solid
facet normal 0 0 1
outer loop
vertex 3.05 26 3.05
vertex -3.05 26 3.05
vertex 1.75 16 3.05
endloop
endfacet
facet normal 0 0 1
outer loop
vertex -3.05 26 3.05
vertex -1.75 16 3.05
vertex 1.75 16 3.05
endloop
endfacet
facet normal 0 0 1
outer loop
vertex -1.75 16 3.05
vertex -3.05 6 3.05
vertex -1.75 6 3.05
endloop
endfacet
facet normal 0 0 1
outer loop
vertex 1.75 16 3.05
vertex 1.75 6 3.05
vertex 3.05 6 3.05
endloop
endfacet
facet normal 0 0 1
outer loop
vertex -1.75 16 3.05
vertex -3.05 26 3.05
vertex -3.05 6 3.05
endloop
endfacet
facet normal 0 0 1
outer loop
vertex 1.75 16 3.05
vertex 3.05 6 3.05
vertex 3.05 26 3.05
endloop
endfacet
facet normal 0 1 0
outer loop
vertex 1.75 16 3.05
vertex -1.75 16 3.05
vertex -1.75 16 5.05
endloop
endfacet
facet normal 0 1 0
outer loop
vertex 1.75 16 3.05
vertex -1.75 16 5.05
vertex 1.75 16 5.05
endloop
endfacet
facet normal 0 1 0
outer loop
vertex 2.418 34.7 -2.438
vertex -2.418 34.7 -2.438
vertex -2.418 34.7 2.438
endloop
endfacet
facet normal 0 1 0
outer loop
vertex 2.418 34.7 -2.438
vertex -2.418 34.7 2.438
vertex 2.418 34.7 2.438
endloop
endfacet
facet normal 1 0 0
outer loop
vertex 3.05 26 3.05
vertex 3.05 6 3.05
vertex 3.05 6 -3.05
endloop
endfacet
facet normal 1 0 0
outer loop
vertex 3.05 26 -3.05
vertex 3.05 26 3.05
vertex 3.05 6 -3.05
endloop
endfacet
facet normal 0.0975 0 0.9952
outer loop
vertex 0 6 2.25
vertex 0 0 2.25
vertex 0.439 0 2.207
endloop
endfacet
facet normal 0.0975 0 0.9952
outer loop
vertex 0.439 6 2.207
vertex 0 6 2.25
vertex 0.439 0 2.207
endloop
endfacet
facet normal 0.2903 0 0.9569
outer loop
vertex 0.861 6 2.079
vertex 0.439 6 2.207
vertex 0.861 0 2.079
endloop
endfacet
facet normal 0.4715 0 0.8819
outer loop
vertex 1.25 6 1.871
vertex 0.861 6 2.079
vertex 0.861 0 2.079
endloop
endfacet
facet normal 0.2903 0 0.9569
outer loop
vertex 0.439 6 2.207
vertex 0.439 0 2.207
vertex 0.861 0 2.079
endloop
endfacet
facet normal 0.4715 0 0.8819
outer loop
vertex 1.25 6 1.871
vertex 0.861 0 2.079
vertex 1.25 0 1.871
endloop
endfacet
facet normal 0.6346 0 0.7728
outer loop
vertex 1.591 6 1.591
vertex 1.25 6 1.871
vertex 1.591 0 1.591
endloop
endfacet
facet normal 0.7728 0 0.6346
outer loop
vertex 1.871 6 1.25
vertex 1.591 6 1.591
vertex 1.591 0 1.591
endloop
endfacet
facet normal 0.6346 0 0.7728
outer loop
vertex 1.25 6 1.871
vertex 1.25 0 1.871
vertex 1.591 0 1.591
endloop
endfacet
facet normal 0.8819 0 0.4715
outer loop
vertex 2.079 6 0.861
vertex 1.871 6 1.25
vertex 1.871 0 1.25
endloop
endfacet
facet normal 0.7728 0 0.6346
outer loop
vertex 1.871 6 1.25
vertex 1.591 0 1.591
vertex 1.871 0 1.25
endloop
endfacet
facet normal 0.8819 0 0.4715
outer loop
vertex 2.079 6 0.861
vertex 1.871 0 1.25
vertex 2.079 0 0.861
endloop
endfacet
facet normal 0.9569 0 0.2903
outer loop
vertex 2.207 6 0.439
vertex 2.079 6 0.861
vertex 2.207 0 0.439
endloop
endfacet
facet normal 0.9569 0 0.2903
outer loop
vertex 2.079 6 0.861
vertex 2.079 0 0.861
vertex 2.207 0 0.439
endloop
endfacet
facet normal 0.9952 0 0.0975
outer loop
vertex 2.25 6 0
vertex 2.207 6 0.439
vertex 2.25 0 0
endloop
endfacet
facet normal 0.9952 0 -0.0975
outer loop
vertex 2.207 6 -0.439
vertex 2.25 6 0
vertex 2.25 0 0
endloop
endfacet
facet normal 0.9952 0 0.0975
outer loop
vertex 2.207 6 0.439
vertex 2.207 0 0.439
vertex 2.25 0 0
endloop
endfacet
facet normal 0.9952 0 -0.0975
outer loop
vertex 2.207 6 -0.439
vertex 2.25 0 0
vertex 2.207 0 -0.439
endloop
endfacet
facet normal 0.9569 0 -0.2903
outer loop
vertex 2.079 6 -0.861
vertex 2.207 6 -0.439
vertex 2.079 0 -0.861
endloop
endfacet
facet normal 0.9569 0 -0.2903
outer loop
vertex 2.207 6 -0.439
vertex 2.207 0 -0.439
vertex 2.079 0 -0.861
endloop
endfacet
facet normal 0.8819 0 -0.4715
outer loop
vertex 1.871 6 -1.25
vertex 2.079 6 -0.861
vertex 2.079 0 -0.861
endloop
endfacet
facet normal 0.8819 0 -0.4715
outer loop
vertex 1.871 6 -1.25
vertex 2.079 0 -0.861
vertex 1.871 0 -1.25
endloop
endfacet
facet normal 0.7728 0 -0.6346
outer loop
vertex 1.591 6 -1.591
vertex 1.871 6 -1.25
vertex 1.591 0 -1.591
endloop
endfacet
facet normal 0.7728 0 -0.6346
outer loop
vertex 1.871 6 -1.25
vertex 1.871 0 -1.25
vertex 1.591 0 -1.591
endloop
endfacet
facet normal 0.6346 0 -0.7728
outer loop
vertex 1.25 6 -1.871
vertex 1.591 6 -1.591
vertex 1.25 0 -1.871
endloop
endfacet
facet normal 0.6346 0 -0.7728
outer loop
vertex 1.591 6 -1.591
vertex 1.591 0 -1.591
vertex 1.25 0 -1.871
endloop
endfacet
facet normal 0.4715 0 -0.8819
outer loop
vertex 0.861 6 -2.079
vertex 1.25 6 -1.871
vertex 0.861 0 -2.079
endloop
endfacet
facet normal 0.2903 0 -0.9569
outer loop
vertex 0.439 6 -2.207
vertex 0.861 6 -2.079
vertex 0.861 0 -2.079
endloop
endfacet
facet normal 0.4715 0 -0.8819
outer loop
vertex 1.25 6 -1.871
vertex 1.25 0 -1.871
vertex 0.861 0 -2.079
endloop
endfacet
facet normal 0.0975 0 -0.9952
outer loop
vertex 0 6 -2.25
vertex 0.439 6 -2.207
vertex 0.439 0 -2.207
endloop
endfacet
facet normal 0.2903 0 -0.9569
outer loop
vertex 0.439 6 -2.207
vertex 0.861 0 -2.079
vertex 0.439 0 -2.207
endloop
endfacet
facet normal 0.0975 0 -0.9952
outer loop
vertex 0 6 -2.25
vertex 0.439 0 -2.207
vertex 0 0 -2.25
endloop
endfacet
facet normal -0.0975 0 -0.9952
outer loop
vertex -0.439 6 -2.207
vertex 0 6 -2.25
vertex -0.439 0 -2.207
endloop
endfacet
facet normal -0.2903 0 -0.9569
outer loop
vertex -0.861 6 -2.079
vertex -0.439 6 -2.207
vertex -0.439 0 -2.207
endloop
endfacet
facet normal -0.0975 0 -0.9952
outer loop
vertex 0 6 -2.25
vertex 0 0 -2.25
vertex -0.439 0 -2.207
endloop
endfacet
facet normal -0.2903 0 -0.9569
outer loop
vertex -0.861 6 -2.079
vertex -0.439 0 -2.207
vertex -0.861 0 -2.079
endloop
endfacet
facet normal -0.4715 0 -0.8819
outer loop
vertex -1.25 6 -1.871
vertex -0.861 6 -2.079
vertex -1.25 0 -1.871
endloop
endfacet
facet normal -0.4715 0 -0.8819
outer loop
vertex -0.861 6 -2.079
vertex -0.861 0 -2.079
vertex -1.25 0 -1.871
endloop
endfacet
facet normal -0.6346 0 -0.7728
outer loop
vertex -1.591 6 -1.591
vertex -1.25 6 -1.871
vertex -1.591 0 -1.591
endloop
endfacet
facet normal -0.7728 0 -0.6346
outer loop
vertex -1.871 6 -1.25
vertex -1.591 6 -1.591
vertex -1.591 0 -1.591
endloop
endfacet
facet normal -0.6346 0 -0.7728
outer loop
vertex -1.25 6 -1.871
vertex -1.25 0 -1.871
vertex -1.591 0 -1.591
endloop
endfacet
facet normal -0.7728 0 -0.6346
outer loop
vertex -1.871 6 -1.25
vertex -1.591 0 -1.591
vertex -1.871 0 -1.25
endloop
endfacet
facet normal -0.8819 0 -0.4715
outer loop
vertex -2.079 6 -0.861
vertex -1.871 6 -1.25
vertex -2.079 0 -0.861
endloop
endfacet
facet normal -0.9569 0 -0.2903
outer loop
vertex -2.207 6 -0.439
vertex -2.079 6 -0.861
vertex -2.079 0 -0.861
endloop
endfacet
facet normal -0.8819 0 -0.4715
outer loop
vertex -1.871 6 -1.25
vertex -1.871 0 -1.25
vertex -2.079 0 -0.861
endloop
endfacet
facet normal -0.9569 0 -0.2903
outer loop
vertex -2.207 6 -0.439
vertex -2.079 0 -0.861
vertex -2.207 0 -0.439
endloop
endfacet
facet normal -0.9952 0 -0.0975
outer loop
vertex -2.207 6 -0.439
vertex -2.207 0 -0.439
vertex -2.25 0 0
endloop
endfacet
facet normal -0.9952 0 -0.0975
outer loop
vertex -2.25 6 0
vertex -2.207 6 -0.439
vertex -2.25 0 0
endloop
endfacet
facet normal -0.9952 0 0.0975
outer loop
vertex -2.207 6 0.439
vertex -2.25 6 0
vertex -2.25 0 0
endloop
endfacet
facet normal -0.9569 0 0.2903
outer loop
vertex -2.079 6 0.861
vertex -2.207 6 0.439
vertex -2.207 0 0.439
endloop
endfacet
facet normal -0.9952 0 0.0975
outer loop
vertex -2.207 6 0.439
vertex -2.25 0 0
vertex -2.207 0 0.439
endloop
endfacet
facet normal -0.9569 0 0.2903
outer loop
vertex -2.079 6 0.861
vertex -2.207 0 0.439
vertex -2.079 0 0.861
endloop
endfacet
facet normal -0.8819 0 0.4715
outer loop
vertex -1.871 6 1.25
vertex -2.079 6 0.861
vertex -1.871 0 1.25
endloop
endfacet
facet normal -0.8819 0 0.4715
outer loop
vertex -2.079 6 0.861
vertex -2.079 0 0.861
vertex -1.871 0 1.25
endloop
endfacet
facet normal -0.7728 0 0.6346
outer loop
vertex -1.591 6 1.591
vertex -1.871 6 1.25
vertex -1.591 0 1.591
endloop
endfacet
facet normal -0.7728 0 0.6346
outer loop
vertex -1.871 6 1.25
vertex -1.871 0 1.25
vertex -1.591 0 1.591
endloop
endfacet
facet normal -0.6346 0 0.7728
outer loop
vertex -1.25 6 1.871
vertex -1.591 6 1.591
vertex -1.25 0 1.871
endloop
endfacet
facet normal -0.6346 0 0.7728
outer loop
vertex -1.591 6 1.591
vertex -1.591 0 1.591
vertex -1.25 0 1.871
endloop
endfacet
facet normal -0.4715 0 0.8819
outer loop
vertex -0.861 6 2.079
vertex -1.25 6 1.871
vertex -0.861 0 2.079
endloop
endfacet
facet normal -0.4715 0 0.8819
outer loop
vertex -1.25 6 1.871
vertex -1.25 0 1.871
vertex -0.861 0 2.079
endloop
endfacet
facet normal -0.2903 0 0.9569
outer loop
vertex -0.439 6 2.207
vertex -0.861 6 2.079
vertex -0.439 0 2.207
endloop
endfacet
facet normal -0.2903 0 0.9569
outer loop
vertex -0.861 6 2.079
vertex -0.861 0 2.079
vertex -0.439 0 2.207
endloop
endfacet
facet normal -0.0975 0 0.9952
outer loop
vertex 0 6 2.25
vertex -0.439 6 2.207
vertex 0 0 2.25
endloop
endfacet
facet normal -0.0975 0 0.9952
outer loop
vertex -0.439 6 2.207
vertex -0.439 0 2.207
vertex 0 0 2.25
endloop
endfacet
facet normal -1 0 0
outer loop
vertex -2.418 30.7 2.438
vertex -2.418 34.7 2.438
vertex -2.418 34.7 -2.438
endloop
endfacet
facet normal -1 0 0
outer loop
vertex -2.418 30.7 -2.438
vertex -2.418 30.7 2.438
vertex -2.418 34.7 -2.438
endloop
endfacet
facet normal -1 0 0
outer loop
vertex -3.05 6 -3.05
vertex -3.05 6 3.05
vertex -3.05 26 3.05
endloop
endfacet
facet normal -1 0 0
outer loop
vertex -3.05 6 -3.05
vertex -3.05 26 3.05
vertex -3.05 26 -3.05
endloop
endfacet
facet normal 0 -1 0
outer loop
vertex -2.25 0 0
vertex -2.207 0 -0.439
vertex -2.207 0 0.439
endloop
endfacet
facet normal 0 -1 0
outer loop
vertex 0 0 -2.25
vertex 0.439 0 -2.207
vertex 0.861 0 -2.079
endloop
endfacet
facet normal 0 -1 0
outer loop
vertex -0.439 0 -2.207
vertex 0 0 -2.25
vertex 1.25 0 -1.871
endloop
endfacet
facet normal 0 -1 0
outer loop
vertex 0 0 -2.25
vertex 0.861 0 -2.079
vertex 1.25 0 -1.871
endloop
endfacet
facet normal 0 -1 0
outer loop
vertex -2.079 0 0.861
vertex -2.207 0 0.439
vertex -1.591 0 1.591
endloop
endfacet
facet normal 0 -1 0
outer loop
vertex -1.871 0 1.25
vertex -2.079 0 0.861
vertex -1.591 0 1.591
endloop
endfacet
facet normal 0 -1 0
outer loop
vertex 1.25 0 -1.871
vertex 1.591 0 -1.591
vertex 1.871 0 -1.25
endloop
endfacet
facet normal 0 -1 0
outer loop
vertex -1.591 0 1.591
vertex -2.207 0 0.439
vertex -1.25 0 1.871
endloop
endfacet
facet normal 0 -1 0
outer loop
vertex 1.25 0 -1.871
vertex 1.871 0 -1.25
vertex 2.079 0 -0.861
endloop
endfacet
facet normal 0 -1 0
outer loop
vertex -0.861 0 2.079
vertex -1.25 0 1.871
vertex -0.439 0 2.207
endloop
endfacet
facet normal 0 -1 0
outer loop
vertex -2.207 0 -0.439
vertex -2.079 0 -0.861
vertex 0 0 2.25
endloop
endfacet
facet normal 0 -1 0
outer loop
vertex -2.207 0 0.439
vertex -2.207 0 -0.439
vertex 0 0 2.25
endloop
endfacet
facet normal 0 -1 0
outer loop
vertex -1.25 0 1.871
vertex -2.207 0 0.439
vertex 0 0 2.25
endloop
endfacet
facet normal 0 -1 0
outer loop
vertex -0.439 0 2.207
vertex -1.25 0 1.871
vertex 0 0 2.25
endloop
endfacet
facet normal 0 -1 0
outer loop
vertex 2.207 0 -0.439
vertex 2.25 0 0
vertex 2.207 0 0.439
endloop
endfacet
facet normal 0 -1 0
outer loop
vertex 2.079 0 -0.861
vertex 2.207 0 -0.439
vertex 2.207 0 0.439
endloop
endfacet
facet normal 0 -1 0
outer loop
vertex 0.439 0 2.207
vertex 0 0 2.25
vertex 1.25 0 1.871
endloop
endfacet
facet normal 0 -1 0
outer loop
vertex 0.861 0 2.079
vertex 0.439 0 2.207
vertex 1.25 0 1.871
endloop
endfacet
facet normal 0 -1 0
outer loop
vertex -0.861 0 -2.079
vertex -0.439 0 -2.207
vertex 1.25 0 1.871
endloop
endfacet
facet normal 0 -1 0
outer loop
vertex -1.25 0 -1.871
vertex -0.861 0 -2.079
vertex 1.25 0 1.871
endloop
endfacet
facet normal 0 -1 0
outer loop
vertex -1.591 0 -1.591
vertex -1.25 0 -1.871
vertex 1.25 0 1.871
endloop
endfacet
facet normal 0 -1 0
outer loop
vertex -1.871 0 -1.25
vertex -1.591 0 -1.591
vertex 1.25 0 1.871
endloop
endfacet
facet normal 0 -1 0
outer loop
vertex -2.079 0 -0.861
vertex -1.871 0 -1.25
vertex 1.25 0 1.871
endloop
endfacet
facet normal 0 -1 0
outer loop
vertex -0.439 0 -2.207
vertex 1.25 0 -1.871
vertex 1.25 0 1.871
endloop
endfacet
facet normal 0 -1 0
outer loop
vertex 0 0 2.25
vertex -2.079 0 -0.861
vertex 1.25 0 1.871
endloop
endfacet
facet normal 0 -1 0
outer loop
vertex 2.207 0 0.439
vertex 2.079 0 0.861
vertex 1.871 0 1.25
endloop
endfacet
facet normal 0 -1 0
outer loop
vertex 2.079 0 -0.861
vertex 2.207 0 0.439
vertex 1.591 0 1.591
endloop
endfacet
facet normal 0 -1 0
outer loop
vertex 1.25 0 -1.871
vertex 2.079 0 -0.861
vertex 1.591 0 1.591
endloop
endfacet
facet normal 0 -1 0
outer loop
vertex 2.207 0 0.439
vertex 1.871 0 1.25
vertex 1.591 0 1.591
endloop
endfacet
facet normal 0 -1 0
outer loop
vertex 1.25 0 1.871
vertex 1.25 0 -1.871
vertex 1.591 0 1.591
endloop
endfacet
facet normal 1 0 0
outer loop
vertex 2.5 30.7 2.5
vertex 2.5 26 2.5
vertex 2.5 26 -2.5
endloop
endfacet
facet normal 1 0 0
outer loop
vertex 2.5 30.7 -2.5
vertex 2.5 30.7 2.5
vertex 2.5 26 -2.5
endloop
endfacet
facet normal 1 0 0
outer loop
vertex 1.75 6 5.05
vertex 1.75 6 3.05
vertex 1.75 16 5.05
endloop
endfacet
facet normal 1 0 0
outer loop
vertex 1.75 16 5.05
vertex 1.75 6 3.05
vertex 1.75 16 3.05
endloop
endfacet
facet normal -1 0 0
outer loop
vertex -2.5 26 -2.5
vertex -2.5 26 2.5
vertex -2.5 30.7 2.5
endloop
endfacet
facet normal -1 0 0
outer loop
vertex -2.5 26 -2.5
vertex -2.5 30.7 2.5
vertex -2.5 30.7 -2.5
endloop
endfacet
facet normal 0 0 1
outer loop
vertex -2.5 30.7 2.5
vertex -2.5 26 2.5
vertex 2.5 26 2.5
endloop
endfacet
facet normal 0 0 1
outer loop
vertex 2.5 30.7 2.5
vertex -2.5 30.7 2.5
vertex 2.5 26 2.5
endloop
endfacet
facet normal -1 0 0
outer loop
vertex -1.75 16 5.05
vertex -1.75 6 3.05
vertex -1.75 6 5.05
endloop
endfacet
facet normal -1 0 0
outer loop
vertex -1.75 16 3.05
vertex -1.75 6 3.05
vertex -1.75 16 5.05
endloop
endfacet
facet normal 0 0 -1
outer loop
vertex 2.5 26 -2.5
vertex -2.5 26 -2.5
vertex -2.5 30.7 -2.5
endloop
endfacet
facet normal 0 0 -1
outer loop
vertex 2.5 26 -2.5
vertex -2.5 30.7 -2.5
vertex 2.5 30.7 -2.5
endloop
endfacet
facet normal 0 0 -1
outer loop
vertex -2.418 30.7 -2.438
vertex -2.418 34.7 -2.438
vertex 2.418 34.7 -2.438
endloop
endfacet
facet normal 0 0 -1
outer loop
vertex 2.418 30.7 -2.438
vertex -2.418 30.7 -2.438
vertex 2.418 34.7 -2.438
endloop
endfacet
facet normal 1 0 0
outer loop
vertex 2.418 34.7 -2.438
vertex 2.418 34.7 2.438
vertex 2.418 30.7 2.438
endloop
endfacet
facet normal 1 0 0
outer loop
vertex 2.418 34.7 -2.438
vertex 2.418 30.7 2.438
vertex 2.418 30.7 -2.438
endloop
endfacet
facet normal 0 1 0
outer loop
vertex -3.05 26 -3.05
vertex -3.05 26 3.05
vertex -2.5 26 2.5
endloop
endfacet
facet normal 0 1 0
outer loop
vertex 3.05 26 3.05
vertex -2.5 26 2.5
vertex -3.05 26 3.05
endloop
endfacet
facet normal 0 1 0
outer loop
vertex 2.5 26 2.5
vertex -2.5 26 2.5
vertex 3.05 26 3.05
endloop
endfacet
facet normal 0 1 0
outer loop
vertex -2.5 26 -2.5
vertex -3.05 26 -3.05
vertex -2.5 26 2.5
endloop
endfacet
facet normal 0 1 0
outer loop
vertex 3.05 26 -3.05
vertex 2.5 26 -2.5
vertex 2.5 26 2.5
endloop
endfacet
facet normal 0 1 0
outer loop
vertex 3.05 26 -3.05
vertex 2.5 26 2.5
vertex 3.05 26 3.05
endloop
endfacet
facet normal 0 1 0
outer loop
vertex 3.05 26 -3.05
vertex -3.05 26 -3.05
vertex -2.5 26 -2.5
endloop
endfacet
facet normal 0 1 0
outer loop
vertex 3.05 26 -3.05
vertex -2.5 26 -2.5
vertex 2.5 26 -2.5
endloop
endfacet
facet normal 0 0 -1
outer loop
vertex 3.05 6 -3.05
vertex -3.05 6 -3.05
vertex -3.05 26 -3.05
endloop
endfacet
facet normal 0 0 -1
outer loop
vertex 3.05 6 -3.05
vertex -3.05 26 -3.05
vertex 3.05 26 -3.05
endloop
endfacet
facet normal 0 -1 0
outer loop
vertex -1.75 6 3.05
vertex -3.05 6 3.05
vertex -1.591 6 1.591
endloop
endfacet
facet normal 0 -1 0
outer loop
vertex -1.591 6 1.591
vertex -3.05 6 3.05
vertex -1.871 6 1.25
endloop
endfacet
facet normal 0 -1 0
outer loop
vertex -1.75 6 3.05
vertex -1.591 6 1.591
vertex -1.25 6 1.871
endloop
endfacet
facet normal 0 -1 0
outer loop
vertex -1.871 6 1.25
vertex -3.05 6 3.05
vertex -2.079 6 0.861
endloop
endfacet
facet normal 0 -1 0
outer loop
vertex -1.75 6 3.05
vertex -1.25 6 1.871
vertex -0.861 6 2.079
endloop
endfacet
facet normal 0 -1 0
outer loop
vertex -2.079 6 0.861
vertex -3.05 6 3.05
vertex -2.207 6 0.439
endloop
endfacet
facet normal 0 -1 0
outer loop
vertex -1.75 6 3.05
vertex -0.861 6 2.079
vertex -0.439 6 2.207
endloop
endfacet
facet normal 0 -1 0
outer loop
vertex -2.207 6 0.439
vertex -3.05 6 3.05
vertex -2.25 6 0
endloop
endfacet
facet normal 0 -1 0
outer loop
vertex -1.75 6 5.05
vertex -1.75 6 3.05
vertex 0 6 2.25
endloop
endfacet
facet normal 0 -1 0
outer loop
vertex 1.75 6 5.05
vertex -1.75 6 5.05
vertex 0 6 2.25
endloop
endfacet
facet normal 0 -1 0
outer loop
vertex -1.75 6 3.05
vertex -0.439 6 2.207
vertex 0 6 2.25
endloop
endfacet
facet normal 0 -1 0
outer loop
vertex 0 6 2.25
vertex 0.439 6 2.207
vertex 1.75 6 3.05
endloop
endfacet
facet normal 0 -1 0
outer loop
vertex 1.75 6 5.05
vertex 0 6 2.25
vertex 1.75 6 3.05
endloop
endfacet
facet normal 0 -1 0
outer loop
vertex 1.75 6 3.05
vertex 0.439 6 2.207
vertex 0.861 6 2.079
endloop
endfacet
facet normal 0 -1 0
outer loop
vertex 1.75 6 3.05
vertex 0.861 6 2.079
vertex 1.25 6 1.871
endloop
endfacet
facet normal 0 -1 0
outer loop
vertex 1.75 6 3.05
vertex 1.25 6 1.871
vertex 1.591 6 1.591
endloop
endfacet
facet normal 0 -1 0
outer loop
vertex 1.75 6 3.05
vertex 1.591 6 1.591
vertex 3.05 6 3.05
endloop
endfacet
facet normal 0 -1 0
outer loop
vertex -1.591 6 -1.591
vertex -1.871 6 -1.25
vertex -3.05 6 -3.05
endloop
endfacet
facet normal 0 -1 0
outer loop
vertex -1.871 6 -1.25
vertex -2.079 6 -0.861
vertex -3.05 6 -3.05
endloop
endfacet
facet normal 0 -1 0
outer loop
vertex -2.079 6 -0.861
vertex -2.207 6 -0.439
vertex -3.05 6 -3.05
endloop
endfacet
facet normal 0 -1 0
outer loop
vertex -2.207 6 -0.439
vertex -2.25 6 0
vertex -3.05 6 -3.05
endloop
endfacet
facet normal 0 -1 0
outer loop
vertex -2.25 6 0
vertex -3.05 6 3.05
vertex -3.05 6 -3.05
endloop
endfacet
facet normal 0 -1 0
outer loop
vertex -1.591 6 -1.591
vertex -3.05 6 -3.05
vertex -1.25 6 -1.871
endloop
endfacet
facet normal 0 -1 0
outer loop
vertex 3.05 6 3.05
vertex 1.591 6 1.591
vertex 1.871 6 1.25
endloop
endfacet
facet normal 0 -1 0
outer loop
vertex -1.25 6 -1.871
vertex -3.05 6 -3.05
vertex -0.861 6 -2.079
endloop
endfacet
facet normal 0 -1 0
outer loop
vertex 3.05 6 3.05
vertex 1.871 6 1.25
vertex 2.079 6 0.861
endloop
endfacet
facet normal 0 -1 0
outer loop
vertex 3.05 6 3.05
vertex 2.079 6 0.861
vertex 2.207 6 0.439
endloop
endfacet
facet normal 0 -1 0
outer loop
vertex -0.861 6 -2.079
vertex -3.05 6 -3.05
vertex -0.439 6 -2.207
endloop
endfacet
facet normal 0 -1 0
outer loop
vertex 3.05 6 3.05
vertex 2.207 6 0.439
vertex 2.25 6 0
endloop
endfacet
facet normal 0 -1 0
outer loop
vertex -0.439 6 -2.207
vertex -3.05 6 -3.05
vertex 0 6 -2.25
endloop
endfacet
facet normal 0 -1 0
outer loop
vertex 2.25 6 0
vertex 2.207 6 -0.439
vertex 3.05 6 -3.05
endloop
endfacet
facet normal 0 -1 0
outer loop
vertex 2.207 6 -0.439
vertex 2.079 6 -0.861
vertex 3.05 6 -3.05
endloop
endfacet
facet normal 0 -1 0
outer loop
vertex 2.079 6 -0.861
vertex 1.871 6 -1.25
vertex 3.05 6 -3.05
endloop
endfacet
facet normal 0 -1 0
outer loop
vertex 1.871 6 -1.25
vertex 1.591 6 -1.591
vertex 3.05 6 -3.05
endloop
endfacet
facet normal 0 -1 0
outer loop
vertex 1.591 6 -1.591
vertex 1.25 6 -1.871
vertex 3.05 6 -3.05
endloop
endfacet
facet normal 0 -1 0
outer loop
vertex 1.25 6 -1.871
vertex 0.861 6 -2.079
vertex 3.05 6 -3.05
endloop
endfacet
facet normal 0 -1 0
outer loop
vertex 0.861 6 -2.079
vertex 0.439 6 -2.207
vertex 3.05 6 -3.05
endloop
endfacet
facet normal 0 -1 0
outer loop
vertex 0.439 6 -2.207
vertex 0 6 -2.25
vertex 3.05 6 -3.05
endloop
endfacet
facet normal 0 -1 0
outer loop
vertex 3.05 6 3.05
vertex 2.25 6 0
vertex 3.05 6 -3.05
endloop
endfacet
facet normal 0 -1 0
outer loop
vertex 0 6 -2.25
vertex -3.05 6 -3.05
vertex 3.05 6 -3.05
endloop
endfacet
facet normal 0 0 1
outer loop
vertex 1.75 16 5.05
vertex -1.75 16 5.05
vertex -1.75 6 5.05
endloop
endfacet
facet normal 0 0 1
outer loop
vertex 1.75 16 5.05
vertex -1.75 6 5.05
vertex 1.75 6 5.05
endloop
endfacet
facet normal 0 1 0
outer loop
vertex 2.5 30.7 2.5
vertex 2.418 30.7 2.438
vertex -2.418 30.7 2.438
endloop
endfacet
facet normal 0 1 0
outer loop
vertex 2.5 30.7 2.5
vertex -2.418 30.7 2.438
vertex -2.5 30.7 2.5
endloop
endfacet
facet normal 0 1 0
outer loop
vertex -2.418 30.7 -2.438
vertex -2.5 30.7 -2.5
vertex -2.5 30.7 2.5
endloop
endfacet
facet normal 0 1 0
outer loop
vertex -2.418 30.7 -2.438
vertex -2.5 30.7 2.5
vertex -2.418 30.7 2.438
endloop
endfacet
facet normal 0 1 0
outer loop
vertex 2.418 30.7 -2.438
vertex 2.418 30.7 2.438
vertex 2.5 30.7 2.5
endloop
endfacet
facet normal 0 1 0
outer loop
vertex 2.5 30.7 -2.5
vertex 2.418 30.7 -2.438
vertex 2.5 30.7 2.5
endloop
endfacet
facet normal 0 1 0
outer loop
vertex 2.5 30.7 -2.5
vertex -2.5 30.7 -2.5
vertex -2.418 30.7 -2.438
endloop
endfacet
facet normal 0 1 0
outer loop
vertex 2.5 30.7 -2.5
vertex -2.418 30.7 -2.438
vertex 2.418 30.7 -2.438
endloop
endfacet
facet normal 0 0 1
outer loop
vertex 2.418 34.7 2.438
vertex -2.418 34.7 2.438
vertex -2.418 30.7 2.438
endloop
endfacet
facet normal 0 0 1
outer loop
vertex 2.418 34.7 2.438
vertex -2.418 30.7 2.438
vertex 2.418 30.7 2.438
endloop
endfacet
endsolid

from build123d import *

# Parameters (mm, degrees)
SKETCH1_R           = 2.25
BOSS_EXTRUDE1_DEPTH = 6
SKETCH2_W           = 6.1
SKETCH2_H           = 6.1
BOSS_EXTRUDE2_DEPTH = 20
SKETCH3_W           = 5
SKETCH3_H           = 5
BOSS_EXTRUDE3_DEPTH = 8.7
SKETCH4_OUTSIDE_W   = 15.252
SKETCH4_OUTSIDE_H   = 15.252
SKETCH4_OUTSIDE_W_2 = 4.836378696
SKETCH4_OUTSIDE_H_2 = 4.876198926
CUT_EXTRUDE1_DEPTH  = 4
SKETCH5_W           = 3.5
SKETCH5_H           = 10
BOSS_EXTRUDE4_DEPTH = 2


with BuildPart() as part:
    # Sketch1 → Boss-Extrude1 (new body)
    with BuildSketch(Plane(origin=(0, 0, 0), x_dir=(1, 0, 0), z_dir=(0, 1, 0))):
        with Locations(Location((0, 0, 0), (0, 0, 270))):
            Circle(SKETCH1_R)
    extrude(amount=BOSS_EXTRUDE1_DEPTH)

    # Sketch2 → Boss-Extrude2 (add)
    with BuildSketch(Plane(origin=(0, 6, 0), x_dir=(1, 0, 0), z_dir=(0, 1, 0))):
        Rectangle(SKETCH2_W, SKETCH2_H)
    extrude(amount=BOSS_EXTRUDE2_DEPTH)

    # Sketch3 → Boss-Extrude3 (add)
    with BuildSketch(Plane(origin=(0, 26, 0), x_dir=(1, 0, 0), z_dir=(0, 1, 0))):
        Rectangle(SKETCH3_W, SKETCH3_H)
    extrude(amount=BOSS_EXTRUDE3_DEPTH)

    # Sketch4 outside → Cut-Extrude1 (cut)
    with BuildSketch(Plane(origin=(0, 34.7, 0), x_dir=(1, 0, 0), z_dir=(0, 1, 0))):
        Rectangle(SKETCH4_OUTSIDE_W, SKETCH4_OUTSIDE_H)
        Rectangle(SKETCH4_OUTSIDE_W_2, SKETCH4_OUTSIDE_H_2, mode=Mode.SUBTRACT)
    extrude(amount=-CUT_EXTRUDE1_DEPTH, mode=Mode.SUBTRACT)

    # Sketch5 → Boss-Extrude4 (add)
    with BuildSketch(Plane.XY.offset(3.05)):
        with Locations((0, 11)):
            Rectangle(SKETCH5_W, SKETCH5_H)
    extrude(amount=BOSS_EXTRUDE4_DEPTH)


solid = part.part
